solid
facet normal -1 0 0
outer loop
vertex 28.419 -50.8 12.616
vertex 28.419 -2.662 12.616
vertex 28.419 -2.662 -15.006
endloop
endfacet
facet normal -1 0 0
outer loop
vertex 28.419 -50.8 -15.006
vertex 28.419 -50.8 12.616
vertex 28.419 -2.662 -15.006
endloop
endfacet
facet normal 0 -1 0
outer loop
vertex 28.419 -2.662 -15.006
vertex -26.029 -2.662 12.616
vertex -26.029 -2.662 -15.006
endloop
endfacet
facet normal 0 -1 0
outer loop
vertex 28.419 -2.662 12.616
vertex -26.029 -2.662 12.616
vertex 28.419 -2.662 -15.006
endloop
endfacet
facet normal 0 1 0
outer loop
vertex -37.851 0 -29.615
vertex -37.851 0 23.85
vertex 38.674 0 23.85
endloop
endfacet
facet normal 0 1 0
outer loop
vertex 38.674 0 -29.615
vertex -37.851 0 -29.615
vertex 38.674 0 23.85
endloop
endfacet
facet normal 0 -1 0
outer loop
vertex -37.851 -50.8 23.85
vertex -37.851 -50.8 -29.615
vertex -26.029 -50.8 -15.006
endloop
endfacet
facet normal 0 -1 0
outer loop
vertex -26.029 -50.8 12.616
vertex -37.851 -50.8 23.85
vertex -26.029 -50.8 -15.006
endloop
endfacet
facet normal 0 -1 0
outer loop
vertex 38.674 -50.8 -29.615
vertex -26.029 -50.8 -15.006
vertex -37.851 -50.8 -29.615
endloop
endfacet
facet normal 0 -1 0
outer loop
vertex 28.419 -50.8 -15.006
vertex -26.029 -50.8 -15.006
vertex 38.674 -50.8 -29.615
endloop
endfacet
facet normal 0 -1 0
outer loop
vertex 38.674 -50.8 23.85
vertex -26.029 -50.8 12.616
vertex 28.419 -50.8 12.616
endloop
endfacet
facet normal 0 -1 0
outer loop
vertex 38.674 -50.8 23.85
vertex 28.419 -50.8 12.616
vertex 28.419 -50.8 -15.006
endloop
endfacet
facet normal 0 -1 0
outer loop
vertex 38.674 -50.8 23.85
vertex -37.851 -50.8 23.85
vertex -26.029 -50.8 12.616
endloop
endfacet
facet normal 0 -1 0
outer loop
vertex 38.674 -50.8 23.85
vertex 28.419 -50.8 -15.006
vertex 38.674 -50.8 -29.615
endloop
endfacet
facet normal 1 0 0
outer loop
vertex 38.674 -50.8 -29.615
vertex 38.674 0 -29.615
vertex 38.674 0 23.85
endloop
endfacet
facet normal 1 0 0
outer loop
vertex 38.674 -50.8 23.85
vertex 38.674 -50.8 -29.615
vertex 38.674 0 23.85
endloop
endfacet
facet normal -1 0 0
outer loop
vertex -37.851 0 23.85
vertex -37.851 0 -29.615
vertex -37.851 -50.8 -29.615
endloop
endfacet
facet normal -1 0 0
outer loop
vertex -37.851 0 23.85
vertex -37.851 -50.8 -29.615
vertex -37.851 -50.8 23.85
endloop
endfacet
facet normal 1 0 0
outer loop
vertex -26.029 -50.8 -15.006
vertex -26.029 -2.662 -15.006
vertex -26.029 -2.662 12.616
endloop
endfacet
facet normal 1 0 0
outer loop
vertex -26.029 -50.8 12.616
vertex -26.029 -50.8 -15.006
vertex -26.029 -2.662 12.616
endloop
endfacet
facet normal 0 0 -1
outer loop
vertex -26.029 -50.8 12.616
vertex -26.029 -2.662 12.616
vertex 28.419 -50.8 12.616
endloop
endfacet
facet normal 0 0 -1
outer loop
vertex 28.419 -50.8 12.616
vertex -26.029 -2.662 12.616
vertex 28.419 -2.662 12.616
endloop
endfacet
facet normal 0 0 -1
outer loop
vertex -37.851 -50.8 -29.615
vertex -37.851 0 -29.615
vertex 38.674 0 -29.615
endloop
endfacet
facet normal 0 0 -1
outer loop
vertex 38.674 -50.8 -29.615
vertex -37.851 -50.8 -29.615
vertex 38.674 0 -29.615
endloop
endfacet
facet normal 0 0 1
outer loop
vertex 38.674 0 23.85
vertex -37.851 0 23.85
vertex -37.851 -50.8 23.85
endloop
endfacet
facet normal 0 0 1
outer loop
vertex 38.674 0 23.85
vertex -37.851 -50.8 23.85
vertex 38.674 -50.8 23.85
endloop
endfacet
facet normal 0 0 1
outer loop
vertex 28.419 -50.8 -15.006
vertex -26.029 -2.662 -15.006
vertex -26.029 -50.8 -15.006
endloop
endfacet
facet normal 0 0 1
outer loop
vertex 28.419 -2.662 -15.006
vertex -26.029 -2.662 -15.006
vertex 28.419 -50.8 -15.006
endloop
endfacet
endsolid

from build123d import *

# Parameters (mm, degrees)
F0_W     = 76.5245743096
F0_H     = 53.4645225853
F0_W_2   = 54.4477272779
F0_H_2   = 5.311973393
F0_H_3   = 5.5775716901
F1_DEPTH = 50.8
F2_W     = 54.4477272779
F2_H     = 2.6621837169
F3_DEPTH = 30.6


with BuildPart() as f1:
    # F0 (on Front) → F1 (new body)
    with BuildSketch(Plane.XZ):
        with Locations((0.4114229232, -2.8822431341)):
            Rectangle(F0_W, F0_H)
        Polygon((-26.0286685079, 12.615935877), (-26.0286685079, 17.9279092699), (28.4190587699, 17.9279092699), (28.4190587699, 12.615935877), (28.4190587699, -15.0063242763), (28.4190587699, -20.5838959664), (-26.0286685079, -20.5838959664), (-26.0286685079, -15.0063242763), align=None, mode=Mode.SUBTRACT)
        with Locations((1.195195131, 15.2719225734)):
            Rectangle(F0_W_2, F0_H_2)
        with Locations((1.195195131, -17.7951101214)):
            Rectangle(F0_W_2, F0_H_3)
    extrude(amount=F1_DEPTH)

    # F2 (on face) → F3 (join)
    with BuildSketch(Plane(origin=(0, 0, 12.615935877), x_dir=(1, 0, 0), z_dir=(0, 0, -1))):
        with Locations((1.195195131, 1.3310918584)):
            Rectangle(F2_W, F2_H)
    extrude(amount=F3_DEPTH)


solid = f1.part
